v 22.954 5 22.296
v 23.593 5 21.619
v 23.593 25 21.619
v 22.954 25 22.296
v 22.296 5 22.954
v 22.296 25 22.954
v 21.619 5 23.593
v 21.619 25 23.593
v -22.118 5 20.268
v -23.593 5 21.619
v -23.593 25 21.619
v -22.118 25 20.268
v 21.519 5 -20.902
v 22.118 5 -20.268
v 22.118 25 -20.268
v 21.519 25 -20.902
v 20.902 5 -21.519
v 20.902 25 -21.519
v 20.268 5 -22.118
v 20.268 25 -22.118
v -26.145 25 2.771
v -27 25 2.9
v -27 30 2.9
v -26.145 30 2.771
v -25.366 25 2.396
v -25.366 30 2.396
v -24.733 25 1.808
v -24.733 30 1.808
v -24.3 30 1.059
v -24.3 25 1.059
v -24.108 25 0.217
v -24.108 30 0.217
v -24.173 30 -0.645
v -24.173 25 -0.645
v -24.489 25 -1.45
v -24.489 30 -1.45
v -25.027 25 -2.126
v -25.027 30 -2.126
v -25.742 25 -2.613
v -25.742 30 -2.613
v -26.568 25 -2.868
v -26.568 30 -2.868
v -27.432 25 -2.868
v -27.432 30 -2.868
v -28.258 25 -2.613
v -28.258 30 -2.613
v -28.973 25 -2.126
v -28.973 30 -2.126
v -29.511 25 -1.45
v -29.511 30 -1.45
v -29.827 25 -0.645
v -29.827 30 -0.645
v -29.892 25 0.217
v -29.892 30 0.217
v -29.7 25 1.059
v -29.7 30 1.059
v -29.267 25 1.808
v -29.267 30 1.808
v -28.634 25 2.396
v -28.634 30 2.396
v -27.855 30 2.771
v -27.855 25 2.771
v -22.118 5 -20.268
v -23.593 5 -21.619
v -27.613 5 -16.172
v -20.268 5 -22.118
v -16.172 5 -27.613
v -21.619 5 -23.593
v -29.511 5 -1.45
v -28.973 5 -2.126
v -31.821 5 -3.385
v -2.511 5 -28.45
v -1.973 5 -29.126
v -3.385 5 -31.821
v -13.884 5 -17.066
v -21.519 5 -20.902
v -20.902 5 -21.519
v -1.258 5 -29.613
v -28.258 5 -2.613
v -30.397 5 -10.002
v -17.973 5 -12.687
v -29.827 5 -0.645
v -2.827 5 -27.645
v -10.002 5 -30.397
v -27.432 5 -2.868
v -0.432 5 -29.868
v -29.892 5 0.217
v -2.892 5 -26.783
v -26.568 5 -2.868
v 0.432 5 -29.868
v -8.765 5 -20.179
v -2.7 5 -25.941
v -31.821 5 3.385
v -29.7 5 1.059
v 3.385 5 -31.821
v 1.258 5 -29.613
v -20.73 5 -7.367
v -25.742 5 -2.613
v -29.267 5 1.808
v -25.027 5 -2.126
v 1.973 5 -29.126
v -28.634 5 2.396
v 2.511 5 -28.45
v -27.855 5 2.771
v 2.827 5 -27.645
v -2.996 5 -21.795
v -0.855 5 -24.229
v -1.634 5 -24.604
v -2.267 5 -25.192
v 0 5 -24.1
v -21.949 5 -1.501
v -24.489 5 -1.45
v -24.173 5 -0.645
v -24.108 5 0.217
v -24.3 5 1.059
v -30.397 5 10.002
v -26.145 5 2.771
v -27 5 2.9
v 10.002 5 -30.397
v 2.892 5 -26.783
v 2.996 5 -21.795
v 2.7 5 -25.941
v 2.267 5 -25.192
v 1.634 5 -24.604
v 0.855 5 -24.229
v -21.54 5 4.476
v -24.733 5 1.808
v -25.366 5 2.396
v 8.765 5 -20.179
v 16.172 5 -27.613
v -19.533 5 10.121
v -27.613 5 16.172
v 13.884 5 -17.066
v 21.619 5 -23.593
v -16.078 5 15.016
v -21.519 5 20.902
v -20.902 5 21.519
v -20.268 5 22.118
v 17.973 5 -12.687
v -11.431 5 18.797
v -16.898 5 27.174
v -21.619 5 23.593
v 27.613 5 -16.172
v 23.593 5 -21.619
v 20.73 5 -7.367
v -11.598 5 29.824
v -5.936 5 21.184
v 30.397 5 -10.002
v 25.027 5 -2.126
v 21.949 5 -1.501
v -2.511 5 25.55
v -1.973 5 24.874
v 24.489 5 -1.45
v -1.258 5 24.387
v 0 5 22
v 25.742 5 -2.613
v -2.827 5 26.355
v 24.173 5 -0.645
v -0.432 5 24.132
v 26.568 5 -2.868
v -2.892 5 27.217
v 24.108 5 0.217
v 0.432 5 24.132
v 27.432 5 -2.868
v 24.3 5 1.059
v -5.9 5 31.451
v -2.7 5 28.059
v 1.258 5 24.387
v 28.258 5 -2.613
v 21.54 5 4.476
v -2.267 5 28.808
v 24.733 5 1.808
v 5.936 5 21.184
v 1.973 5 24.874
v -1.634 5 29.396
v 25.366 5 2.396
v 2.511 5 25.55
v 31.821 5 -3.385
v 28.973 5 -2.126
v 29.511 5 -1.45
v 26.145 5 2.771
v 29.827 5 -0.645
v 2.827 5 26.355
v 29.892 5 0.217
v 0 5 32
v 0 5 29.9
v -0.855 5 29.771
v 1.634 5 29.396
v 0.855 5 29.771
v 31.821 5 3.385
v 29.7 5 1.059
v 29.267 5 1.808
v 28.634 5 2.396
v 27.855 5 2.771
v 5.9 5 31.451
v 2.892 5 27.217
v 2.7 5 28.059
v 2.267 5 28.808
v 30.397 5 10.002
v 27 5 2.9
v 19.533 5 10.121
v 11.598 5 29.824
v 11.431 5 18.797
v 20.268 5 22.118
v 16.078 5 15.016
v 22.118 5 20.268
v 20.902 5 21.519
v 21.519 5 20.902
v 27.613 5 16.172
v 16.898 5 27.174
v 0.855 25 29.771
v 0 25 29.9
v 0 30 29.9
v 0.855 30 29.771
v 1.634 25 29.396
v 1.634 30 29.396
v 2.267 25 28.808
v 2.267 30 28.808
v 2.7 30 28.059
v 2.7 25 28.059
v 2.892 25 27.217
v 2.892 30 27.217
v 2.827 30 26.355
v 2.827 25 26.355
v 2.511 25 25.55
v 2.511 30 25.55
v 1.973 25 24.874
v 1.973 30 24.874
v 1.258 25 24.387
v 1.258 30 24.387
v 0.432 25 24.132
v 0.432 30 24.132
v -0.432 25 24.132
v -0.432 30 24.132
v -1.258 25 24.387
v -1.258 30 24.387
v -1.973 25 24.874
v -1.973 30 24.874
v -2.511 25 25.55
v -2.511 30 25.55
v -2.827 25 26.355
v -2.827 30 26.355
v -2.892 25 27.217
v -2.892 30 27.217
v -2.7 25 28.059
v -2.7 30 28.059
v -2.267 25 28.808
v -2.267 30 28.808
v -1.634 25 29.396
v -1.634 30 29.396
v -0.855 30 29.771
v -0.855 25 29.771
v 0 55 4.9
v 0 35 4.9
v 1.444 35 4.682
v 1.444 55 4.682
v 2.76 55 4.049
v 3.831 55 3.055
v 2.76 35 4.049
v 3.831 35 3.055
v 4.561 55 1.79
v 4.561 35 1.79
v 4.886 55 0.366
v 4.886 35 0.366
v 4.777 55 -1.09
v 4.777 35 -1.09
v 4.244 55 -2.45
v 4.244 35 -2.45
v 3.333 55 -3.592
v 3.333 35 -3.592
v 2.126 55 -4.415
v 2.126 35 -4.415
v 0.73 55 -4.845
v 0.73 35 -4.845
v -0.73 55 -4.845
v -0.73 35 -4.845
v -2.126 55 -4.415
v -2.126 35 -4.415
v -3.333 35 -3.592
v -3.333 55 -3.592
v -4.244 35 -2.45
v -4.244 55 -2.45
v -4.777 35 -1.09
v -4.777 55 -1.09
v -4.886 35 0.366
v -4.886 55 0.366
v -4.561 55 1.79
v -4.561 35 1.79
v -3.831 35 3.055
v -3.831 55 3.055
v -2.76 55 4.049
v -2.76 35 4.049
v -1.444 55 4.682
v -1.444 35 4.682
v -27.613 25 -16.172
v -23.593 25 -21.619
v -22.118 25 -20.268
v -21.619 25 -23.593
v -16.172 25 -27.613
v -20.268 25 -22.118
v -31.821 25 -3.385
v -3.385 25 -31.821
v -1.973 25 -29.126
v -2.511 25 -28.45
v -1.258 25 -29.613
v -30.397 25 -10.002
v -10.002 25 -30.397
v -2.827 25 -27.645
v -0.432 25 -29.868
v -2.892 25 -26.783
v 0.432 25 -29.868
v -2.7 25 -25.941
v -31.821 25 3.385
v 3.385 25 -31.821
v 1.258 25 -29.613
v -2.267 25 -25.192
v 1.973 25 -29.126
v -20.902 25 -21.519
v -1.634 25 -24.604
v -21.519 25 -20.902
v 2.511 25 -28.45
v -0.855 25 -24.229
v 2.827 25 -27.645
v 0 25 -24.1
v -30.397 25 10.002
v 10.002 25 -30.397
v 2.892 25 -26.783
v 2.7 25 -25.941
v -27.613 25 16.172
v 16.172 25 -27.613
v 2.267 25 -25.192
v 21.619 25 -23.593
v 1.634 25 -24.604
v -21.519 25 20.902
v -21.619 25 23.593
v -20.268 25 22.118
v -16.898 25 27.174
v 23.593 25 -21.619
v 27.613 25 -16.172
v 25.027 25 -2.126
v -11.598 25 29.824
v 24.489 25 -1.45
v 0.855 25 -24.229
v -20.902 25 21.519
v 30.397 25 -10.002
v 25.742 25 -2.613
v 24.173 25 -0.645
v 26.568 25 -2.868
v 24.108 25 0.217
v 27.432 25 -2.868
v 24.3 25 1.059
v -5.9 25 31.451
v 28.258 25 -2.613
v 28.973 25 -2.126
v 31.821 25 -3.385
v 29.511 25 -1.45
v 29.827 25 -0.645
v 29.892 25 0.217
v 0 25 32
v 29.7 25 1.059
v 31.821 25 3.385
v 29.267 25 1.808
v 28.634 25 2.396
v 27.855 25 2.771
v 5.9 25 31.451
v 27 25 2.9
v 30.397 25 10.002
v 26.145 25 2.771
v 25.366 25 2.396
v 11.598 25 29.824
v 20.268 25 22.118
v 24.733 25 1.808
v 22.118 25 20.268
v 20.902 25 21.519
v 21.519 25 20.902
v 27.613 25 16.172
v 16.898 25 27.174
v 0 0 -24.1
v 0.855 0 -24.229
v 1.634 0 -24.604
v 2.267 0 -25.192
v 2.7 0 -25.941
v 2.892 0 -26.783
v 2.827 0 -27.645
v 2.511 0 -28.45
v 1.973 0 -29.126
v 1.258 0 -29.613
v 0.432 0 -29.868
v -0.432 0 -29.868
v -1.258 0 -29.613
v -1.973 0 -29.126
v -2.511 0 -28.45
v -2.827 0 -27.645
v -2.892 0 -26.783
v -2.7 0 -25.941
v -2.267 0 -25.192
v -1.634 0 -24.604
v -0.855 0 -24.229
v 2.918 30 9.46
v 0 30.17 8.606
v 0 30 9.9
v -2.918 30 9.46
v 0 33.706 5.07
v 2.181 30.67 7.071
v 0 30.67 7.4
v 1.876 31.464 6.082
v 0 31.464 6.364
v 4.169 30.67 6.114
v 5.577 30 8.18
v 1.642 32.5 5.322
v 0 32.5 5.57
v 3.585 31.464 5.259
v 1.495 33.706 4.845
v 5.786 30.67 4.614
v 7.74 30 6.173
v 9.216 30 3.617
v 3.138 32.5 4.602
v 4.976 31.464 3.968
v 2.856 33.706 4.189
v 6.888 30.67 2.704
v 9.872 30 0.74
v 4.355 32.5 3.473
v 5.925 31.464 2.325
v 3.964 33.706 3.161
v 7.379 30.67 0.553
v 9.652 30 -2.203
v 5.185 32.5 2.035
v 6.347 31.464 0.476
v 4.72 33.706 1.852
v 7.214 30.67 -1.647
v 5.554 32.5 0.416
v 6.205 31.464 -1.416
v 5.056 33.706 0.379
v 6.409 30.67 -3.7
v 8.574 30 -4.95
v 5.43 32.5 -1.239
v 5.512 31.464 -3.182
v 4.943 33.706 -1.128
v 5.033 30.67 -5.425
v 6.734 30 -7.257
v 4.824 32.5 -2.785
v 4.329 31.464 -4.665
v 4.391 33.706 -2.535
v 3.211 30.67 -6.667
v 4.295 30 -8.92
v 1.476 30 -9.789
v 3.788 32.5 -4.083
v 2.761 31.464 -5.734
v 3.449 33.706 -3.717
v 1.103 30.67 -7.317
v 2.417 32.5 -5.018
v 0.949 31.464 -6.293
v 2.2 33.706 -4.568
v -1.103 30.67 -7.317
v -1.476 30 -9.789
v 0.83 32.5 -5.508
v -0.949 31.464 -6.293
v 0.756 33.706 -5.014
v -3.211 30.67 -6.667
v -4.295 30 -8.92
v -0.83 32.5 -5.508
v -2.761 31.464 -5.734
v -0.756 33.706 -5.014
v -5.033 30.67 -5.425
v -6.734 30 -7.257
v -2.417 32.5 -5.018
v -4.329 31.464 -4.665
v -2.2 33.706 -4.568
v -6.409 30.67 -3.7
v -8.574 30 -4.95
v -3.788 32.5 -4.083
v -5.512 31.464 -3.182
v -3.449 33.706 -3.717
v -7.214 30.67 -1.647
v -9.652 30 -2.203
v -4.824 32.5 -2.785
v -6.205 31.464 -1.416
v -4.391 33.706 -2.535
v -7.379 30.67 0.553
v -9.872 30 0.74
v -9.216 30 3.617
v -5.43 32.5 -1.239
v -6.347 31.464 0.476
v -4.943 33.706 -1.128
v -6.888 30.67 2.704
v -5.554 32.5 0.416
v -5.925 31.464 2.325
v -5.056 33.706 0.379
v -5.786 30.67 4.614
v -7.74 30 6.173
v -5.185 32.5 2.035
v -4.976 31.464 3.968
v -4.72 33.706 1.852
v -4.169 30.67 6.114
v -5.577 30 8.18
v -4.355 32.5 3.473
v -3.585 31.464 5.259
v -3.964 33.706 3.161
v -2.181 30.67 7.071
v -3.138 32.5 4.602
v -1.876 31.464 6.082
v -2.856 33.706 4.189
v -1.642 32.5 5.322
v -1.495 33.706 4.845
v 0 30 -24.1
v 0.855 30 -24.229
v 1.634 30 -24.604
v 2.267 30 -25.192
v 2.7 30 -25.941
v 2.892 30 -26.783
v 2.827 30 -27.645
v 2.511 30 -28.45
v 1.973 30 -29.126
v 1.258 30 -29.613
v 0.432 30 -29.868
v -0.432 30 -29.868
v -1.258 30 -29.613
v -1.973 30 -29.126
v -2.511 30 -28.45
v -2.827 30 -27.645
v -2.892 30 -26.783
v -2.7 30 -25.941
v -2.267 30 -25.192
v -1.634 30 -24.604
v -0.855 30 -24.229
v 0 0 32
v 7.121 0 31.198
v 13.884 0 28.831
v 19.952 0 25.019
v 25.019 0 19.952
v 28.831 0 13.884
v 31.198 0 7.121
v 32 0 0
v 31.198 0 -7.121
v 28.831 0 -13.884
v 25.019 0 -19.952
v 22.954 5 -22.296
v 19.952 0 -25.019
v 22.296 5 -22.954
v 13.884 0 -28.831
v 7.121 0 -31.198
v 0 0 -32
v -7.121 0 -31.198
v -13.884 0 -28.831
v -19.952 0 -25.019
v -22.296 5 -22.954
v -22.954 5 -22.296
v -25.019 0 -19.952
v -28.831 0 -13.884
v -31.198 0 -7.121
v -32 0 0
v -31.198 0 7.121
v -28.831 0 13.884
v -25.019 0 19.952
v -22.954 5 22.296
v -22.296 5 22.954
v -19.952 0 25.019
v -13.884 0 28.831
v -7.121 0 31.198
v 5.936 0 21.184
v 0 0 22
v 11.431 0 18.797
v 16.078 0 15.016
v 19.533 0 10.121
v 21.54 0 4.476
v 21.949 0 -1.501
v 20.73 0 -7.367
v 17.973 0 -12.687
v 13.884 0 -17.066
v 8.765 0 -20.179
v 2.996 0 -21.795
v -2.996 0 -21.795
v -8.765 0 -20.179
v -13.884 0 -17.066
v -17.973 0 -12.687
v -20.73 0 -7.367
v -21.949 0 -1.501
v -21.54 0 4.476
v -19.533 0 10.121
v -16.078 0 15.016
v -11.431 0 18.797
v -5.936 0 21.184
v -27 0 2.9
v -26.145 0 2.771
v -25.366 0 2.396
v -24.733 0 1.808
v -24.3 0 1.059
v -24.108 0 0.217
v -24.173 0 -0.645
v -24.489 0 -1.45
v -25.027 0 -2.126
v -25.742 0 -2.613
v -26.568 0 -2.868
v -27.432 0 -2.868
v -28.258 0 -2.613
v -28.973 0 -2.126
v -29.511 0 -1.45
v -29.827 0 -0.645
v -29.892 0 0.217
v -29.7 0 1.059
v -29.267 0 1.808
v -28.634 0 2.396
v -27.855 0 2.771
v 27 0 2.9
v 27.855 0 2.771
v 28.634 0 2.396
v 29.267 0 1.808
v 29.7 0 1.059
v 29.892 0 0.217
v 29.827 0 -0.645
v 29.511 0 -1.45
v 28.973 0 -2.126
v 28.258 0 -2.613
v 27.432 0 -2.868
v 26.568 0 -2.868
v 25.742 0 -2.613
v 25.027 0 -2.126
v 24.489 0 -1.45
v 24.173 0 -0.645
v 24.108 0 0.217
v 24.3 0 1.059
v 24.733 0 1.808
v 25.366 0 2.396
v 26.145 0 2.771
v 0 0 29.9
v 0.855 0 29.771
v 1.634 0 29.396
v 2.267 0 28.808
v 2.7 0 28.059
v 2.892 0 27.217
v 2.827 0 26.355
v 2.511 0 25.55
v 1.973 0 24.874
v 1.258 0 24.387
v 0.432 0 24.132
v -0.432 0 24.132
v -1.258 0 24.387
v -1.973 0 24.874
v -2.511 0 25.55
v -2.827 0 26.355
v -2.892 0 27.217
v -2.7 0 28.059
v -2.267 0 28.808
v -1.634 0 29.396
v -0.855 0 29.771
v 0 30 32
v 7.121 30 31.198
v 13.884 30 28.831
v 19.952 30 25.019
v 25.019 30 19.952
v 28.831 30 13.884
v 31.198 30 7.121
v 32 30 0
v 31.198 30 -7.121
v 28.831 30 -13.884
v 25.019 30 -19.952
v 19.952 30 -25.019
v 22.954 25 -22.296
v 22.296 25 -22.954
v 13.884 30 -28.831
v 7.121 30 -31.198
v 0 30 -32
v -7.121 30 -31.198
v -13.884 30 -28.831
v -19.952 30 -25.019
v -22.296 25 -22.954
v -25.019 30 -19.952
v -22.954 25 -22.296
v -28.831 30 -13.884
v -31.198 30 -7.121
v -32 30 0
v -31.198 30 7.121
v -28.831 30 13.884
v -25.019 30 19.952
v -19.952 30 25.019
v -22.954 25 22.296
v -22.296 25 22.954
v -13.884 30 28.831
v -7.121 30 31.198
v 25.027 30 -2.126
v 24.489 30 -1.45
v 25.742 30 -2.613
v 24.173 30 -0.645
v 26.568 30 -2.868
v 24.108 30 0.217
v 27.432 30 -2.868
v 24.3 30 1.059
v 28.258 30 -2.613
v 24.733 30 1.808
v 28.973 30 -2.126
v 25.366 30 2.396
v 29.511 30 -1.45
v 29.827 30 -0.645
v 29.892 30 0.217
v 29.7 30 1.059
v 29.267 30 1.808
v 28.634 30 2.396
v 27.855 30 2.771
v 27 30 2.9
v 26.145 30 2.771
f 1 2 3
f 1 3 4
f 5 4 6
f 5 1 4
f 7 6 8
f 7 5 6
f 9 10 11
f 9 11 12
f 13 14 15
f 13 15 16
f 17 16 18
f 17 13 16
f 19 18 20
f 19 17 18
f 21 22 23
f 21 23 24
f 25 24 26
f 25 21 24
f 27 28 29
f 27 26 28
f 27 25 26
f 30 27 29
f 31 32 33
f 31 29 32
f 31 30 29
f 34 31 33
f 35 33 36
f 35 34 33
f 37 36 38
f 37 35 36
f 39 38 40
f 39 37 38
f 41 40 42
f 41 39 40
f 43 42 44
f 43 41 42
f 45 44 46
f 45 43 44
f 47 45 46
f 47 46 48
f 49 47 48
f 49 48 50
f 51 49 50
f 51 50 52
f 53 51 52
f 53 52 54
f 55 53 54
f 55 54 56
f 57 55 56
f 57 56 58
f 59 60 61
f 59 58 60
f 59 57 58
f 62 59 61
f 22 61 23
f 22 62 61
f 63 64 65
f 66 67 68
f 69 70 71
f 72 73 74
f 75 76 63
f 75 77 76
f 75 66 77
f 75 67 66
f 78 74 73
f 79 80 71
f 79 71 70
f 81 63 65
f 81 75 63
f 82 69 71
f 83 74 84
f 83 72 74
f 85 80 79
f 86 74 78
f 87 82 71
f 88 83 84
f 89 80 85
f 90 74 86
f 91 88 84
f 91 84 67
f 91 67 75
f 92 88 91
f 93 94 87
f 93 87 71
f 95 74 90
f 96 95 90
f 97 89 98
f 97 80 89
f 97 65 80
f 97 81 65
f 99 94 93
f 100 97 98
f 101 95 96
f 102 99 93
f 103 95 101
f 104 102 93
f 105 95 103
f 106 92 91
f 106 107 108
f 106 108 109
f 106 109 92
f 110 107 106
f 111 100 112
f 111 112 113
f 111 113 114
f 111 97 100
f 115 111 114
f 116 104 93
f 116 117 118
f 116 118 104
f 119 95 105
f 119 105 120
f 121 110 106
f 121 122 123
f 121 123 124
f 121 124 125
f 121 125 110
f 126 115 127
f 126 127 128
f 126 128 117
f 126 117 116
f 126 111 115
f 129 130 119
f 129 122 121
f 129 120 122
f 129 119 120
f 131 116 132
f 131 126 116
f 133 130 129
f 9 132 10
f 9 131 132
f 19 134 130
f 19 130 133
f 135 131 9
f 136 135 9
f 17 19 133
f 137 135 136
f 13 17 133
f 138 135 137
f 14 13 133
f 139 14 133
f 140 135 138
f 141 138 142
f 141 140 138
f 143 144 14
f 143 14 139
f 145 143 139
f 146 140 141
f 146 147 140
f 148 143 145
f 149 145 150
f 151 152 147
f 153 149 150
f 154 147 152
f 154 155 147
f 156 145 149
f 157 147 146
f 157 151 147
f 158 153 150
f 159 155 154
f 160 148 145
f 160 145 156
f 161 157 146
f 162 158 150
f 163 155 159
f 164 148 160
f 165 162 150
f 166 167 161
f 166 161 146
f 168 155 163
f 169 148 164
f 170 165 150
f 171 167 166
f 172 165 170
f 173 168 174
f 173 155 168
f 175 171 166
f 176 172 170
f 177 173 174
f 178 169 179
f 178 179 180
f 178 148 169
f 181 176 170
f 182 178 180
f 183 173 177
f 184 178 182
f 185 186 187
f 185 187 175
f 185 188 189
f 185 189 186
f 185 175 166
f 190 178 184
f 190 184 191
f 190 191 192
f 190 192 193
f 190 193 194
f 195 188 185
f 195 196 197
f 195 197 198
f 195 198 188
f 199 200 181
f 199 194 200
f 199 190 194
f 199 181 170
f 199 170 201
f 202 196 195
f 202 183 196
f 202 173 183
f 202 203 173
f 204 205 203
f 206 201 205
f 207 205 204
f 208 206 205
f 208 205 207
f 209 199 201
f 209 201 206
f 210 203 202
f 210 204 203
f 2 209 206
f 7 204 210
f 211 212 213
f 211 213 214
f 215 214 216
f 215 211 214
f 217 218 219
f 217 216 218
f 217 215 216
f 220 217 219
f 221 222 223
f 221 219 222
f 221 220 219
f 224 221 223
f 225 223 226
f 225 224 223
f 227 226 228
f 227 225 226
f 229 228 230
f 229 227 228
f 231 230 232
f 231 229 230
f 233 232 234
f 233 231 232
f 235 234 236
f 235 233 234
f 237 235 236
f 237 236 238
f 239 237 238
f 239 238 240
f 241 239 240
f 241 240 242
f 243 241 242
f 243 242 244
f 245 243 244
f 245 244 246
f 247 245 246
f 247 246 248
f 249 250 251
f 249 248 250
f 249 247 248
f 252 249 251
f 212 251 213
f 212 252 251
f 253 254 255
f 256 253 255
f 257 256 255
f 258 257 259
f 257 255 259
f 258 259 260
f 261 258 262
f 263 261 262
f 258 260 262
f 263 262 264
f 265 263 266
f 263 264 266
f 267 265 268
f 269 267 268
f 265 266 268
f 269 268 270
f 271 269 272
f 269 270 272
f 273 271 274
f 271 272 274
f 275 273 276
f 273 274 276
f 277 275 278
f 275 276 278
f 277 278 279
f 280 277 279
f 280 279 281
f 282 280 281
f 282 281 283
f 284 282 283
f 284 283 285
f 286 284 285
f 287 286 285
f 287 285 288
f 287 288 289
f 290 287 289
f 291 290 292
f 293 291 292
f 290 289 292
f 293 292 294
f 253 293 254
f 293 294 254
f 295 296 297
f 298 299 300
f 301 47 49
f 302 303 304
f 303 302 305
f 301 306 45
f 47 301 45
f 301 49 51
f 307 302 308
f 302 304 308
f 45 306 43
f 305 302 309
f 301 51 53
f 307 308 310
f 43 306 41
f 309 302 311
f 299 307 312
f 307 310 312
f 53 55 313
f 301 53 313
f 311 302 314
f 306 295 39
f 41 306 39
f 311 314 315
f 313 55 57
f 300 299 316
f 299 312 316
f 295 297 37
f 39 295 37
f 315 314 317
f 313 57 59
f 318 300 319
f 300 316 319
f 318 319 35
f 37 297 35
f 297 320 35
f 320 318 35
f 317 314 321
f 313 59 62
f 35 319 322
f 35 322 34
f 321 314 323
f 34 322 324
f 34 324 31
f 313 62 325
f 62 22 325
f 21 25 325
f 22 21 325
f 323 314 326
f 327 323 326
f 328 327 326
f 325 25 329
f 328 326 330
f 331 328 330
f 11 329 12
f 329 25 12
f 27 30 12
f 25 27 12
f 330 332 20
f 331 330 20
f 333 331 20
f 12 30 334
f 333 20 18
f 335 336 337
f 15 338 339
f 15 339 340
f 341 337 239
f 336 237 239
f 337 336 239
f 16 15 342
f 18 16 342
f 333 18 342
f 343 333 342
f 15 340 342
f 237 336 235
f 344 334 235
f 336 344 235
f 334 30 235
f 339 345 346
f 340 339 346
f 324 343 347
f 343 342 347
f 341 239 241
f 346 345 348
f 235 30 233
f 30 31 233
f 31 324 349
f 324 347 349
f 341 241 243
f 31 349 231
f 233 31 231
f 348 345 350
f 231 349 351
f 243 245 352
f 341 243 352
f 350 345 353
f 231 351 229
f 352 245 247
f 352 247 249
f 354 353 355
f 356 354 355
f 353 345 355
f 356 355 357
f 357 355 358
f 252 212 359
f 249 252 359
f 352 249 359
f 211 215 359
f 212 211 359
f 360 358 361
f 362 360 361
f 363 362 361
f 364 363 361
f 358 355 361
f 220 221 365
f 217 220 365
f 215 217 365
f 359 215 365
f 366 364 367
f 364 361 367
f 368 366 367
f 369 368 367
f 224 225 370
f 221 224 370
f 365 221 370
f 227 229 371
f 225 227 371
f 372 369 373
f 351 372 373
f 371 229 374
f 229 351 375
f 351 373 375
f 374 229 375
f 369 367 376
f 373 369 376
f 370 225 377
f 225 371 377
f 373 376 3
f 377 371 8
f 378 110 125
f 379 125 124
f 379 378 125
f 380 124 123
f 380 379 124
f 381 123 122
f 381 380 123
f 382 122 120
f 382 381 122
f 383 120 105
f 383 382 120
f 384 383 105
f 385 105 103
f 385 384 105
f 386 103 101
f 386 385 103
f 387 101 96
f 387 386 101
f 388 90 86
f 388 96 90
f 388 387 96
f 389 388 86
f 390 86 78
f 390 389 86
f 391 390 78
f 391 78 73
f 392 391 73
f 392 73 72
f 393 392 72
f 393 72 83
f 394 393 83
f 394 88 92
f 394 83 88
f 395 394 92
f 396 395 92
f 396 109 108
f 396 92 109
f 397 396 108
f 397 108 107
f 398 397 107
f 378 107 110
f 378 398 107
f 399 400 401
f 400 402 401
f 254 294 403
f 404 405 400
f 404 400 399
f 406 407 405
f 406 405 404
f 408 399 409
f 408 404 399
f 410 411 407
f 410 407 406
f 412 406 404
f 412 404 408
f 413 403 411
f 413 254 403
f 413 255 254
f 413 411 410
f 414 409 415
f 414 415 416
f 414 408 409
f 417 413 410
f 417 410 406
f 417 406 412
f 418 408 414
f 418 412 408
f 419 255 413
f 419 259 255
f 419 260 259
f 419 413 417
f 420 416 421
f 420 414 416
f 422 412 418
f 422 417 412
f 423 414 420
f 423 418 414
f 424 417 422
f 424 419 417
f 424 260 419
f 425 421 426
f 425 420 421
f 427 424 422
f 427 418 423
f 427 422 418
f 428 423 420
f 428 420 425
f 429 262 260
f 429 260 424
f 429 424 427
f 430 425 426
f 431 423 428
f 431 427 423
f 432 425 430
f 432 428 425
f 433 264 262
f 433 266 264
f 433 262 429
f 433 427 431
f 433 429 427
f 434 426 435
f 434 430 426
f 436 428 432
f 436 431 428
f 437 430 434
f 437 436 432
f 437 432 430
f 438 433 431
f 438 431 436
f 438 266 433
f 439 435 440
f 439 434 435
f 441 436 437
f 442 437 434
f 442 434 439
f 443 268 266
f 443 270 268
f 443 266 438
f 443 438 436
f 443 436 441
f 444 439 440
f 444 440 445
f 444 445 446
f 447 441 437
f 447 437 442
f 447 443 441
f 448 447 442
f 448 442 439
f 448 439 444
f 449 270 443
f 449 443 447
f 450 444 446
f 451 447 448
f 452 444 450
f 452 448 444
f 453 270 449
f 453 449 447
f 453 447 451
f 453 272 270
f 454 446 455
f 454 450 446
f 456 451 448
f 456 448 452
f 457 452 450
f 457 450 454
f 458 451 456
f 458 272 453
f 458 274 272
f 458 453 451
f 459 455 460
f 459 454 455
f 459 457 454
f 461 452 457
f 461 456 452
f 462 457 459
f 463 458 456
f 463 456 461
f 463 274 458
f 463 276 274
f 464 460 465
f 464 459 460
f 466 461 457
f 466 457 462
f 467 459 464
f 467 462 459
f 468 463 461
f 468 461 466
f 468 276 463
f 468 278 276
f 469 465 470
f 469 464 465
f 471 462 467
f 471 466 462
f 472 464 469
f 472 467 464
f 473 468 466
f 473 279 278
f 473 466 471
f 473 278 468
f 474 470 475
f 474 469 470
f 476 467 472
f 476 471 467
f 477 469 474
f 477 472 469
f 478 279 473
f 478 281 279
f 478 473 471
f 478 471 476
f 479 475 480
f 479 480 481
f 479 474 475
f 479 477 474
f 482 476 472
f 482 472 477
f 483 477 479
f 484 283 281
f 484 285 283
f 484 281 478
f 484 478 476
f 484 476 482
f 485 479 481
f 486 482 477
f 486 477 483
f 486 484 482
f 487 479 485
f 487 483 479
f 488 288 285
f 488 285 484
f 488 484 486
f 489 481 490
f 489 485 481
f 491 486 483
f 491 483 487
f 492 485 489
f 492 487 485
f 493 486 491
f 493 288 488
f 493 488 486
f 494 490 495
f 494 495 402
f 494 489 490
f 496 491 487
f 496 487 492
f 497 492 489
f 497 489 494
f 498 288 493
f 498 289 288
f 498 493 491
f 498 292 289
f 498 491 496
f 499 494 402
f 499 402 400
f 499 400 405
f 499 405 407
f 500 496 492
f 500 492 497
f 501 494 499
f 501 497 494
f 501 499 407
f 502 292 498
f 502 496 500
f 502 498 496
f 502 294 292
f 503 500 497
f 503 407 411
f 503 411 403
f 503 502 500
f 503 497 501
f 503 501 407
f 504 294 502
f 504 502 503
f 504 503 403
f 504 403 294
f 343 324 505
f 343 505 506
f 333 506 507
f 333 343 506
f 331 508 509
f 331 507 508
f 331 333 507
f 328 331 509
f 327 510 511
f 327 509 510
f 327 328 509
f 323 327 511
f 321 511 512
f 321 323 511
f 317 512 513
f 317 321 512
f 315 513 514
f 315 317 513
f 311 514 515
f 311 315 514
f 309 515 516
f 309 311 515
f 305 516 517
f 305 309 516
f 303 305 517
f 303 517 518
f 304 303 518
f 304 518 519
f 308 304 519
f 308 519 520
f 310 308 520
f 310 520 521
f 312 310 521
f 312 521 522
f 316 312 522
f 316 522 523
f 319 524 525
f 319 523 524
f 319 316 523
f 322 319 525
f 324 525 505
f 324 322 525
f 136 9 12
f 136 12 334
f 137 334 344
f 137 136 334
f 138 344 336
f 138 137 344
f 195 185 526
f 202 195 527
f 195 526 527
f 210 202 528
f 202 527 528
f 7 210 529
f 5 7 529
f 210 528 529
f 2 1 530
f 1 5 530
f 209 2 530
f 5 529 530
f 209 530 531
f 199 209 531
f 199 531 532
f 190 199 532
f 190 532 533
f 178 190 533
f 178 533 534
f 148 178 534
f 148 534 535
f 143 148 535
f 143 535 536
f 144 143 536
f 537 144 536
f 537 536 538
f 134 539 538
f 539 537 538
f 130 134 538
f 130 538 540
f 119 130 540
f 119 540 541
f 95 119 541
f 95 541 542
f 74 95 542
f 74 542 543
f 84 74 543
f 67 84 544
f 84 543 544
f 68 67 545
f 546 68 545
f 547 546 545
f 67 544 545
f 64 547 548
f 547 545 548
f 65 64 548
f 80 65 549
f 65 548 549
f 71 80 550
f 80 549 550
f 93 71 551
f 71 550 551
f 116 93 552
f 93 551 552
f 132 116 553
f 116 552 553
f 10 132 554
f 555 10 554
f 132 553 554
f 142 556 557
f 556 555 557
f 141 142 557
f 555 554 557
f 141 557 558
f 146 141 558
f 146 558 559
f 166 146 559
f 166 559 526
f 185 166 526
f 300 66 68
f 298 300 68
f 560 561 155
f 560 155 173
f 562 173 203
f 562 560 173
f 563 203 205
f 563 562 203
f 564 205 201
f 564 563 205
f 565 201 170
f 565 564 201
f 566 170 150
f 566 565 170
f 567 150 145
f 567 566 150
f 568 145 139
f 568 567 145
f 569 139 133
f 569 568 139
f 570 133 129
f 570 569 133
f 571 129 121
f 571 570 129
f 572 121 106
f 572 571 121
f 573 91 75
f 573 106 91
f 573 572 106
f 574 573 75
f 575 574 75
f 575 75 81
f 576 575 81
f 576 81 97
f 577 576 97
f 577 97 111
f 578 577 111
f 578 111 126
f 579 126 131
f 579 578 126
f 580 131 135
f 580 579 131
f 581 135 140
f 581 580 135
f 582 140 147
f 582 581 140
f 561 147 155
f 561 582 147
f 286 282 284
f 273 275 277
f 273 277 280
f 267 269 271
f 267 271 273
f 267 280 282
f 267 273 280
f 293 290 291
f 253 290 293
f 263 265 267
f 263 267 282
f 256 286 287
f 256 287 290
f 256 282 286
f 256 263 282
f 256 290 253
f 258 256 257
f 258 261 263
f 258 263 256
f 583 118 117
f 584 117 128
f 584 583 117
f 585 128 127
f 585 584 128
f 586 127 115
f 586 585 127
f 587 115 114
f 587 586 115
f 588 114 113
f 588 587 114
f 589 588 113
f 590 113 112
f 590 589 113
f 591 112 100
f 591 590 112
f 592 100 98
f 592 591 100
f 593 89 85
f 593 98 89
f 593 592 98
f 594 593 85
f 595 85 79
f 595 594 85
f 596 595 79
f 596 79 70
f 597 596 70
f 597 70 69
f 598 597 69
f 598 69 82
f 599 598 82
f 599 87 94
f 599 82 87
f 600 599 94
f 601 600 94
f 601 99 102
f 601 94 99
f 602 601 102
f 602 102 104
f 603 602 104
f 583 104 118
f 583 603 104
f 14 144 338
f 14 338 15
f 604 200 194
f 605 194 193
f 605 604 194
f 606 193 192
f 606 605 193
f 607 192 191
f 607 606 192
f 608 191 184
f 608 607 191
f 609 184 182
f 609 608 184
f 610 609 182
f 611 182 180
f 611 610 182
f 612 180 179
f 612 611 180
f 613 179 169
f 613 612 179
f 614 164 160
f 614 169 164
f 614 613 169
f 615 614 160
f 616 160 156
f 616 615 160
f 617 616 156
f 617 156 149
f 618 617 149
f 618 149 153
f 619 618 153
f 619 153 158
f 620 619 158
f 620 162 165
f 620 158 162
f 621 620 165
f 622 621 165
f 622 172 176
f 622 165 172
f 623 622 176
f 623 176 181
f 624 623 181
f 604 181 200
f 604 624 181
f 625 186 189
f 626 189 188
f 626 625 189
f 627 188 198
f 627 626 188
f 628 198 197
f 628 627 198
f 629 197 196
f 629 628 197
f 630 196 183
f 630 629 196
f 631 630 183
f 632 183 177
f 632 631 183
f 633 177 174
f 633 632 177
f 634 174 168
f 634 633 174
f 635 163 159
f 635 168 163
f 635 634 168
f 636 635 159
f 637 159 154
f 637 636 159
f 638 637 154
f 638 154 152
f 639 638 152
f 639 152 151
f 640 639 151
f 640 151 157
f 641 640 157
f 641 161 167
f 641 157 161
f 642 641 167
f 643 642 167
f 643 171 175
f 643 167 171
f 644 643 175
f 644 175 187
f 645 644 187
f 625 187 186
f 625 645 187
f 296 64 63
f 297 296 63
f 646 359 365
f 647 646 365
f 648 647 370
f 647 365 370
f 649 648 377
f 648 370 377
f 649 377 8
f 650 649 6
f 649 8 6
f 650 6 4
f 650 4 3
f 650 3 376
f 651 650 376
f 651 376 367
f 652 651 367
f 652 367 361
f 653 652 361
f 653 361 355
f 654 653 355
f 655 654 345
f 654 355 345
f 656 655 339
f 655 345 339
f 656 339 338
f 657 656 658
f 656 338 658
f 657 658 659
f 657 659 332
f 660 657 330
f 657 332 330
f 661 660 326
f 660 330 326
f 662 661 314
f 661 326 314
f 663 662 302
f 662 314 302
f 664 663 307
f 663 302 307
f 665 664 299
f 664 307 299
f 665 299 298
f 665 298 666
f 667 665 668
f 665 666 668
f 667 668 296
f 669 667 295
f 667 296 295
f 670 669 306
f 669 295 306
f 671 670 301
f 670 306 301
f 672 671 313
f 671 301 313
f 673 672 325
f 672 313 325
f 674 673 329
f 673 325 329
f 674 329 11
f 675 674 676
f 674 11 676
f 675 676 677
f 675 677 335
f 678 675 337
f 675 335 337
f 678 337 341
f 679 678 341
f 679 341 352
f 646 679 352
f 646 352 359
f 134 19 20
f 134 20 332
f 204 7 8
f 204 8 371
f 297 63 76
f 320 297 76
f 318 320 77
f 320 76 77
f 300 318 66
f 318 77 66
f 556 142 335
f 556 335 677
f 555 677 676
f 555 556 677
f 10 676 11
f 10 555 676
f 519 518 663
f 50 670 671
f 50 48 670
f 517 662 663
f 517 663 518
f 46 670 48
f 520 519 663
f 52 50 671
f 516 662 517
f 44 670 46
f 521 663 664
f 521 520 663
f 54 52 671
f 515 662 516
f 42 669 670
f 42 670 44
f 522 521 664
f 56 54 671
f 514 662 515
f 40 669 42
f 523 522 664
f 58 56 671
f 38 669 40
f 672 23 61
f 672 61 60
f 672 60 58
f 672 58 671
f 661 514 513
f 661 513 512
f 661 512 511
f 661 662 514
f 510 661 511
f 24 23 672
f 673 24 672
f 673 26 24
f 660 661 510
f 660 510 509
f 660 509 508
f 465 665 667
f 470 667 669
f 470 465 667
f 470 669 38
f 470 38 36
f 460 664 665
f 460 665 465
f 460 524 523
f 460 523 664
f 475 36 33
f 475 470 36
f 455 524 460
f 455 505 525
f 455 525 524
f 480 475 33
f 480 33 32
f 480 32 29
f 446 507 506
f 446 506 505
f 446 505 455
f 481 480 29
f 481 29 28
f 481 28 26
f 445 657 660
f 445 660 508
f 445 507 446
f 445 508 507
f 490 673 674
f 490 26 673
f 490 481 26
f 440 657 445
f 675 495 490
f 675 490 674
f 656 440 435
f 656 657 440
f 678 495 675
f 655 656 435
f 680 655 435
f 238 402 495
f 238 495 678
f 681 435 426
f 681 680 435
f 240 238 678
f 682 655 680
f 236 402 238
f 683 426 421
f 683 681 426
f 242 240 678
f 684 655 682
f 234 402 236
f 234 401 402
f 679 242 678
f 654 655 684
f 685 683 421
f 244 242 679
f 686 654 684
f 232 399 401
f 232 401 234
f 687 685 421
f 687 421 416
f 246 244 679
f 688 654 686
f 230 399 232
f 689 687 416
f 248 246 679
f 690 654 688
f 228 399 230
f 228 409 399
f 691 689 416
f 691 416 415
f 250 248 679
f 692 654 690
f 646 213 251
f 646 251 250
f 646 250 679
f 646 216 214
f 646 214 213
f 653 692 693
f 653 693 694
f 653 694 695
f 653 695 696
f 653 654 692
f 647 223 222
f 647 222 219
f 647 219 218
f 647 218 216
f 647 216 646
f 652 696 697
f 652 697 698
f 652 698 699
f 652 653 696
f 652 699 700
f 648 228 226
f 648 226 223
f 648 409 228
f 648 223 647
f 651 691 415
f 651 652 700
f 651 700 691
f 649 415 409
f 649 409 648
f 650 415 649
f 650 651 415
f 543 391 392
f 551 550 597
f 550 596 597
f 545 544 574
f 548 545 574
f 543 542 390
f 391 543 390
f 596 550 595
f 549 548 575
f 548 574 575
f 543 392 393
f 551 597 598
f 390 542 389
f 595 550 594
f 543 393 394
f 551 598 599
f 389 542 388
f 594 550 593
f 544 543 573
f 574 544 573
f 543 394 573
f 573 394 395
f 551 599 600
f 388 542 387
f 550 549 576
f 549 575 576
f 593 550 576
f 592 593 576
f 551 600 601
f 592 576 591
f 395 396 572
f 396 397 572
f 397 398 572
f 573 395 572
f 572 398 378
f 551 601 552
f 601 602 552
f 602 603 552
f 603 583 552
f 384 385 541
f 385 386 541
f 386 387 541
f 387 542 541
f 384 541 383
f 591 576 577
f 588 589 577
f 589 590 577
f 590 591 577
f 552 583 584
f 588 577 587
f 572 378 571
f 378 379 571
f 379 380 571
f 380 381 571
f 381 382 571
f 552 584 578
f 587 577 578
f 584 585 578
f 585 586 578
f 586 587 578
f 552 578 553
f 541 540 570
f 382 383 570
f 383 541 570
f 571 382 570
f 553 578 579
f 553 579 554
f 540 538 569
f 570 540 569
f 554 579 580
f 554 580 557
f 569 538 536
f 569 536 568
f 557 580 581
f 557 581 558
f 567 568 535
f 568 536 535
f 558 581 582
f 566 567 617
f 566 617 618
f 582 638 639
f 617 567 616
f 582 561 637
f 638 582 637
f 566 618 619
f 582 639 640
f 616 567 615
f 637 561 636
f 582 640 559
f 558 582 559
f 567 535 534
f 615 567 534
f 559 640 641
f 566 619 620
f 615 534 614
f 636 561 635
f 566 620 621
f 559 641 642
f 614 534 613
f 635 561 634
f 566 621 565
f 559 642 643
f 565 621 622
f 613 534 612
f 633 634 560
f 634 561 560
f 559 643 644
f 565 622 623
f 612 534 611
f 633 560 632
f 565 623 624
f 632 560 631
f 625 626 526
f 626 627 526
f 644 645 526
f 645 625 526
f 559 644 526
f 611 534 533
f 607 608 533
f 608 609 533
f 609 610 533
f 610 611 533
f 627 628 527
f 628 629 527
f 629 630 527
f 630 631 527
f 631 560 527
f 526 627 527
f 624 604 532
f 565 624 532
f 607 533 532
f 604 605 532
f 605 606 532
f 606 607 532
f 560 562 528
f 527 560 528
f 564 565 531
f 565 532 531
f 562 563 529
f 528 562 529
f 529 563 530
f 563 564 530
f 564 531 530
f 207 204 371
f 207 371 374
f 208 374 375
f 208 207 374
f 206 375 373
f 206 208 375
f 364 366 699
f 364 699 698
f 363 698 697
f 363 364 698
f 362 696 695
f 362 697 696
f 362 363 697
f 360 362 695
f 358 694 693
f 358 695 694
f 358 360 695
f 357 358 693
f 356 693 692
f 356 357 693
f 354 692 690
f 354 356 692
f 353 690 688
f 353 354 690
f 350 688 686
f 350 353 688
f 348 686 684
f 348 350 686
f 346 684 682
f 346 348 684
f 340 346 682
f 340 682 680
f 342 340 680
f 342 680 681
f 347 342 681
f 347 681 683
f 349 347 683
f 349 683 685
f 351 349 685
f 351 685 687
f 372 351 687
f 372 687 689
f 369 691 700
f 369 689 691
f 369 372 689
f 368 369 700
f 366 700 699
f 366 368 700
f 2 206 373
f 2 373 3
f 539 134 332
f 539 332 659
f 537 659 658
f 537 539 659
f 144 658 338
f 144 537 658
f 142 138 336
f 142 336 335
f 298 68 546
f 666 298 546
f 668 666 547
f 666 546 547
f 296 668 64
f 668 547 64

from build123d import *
from build123d.topology import SkipClean

# Parameters (mm, degrees)
SKETCH1_R               = 32
BOSS_EXTRUDE1_DEPTH     = 5
BOSS_EXTRUDE4_DEPTH     = 20
SKETCH5_R               = 32
BOSS_EXTRUDE5_DEPTH     = 5
CUT_EXTRUDE1_DEPTH      = 52.701063819
CUT_EXTRUDE1_DEPTH_BACK = 5
SKETCH2_7_R             = 2.9
SKETCH1_3_R             = 22
CUT_EXTRUDE2_DEPTH      = 10
SKETCH6_R               = 4.9
BOSS_EXTRUDE7_DEPTH     = 25
FILLET1_R               = 5


with BuildPart() as part:
    # Sketch1 → Boss-Extrude1 (new body)
    with BuildSketch(Plane(origin=(0, 0, 0), x_dir=(1, 0, 0), z_dir=(0, 1, 0))):
        Circle(SKETCH1_R)
    extrude(amount=BOSS_EXTRUDE1_DEPTH)

    # Sketch2 → Boss-Extrude4 (add)
    with SkipClean():  # the faces are left unmerged after this step: merging them gives an invalid solid
        with BuildSketch(Plane(origin=(0, 5, 0), x_dir=(1, 0, 0), z_dir=(0, 1, 0))):
            with BuildLine():
                Line((-23.592874778, 21.618886644), (-22.118320104, 20.267706228))
                ThreePointArc((-22.118320104, 20.267706228), (-21.213203436, 21.213203436), (-20.267706228, 22.118320104))
                Line((-20.267706228, 22.118320104), (-21.618886644, 23.592874778))
                ThreePointArc((-21.618886644, 23.592874778), (-22.627416998, 22.627416998), (-23.592874778, 21.618886644))
            make_face()
            with BuildLine():
                Line((23.592874778, 21.618886644), (22.118320104, 20.267706228))
                ThreePointArc((22.118320104, 20.267706228), (21.213203436, 21.213203436), (20.267706228, 22.118320104))
                Line((20.267706228, 22.118320104), (21.618886644, 23.592874778))
                ThreePointArc((21.618886644, 23.592874778), (22.627416998, 22.627416998), (23.592874778, 21.618886644))
            make_face()
            with BuildLine():
                Line((21.618886644, -23.592874778), (20.267706228, -22.118320104))
                ThreePointArc((20.267706228, -22.118320104), (21.213203436, -21.213203436), (22.118320104, -20.267706228))
                Line((22.118320104, -20.267706228), (23.592874778, -21.618886644))
                ThreePointArc((23.592874778, -21.618886644), (22.627416998, -22.627416998), (21.618886644, -23.592874778))
            make_face()
            with BuildLine():
                Line((-23.592874778, -21.618886644), (-22.118320104, -20.267706228))
                ThreePointArc((-22.118320104, -20.267706228), (-21.213203436, -21.213203436), (-20.267706228, -22.118320104))
                Line((-20.267706228, -22.118320104), (-21.618886644, -23.592874778))
                ThreePointArc((-21.618886644, -23.592874778), (-22.627416998, -22.627416998), (-23.592874778, -21.618886644))
            make_face()
        extrude(amount=BOSS_EXTRUDE4_DEPTH)

    # Sketch5 → Boss-Extrude5 (add)
    with SkipClean():  # the faces are left unmerged after this step: merging them gives an invalid solid
        with BuildSketch(Plane(origin=(0, 25, 0), x_dir=(1, 0, 0), z_dir=(0, 1, 0))):
            Circle(SKETCH5_R)
        extrude(amount=BOSS_EXTRUDE5_DEPTH)

    # Sketch2<7> → Cut-Extrude1 (cut, two sides: drawn at the far end of the back side and taken through both)
    with SkipClean():  # the faces are left unmerged after this step: merging them gives an invalid solid
        with BuildSketch(Plane(origin=(0, 5, 0), x_dir=(1, 0, 0), z_dir=(0, 1, 0)).offset(-CUT_EXTRUDE1_DEPTH_BACK)):
            with Locations((0, 27)):
                Circle(SKETCH2_7_R)
            with Locations((27, 0)):
                Circle(SKETCH2_7_R)
            with Locations((0, -27)):
                Circle(SKETCH2_7_R)
            with Locations((-27, 0)):
                Circle(SKETCH2_7_R)
        extrude(amount=CUT_EXTRUDE1_DEPTH + CUT_EXTRUDE1_DEPTH_BACK, mode=Mode.SUBTRACT)

    # Sketch1<3> → Cut-Extrude2 (cut)
    with SkipClean():  # the faces are left unmerged after this step: merging them gives an invalid solid
        with BuildSketch(Plane(origin=(0, 0, 0), x_dir=(1, 0, 0), z_dir=(0, 1, 0))):
            Circle(SKETCH1_3_R)
        extrude(amount=CUT_EXTRUDE2_DEPTH, mode=Mode.SUBTRACT)

    # Sketch6 → Boss-Extrude7 (add)
    with SkipClean():  # the faces are left unmerged after this step: merging them gives an invalid solid
        with BuildSketch(Plane(origin=(0, 30, 0), x_dir=(1, 0, 0), z_dir=(0, 1, 0))):
            Circle(SKETCH6_R)
        extrude(amount=BOSS_EXTRUDE7_DEPTH)

    # Fillet1
    fillet1_edges = [part.edges().sort_by_distance(p)[0] for p in [
        (-4.9, 30, 0),
    ]]
    fillet(fillet1_edges, radius=FILLET1_R)


solid = part.part
